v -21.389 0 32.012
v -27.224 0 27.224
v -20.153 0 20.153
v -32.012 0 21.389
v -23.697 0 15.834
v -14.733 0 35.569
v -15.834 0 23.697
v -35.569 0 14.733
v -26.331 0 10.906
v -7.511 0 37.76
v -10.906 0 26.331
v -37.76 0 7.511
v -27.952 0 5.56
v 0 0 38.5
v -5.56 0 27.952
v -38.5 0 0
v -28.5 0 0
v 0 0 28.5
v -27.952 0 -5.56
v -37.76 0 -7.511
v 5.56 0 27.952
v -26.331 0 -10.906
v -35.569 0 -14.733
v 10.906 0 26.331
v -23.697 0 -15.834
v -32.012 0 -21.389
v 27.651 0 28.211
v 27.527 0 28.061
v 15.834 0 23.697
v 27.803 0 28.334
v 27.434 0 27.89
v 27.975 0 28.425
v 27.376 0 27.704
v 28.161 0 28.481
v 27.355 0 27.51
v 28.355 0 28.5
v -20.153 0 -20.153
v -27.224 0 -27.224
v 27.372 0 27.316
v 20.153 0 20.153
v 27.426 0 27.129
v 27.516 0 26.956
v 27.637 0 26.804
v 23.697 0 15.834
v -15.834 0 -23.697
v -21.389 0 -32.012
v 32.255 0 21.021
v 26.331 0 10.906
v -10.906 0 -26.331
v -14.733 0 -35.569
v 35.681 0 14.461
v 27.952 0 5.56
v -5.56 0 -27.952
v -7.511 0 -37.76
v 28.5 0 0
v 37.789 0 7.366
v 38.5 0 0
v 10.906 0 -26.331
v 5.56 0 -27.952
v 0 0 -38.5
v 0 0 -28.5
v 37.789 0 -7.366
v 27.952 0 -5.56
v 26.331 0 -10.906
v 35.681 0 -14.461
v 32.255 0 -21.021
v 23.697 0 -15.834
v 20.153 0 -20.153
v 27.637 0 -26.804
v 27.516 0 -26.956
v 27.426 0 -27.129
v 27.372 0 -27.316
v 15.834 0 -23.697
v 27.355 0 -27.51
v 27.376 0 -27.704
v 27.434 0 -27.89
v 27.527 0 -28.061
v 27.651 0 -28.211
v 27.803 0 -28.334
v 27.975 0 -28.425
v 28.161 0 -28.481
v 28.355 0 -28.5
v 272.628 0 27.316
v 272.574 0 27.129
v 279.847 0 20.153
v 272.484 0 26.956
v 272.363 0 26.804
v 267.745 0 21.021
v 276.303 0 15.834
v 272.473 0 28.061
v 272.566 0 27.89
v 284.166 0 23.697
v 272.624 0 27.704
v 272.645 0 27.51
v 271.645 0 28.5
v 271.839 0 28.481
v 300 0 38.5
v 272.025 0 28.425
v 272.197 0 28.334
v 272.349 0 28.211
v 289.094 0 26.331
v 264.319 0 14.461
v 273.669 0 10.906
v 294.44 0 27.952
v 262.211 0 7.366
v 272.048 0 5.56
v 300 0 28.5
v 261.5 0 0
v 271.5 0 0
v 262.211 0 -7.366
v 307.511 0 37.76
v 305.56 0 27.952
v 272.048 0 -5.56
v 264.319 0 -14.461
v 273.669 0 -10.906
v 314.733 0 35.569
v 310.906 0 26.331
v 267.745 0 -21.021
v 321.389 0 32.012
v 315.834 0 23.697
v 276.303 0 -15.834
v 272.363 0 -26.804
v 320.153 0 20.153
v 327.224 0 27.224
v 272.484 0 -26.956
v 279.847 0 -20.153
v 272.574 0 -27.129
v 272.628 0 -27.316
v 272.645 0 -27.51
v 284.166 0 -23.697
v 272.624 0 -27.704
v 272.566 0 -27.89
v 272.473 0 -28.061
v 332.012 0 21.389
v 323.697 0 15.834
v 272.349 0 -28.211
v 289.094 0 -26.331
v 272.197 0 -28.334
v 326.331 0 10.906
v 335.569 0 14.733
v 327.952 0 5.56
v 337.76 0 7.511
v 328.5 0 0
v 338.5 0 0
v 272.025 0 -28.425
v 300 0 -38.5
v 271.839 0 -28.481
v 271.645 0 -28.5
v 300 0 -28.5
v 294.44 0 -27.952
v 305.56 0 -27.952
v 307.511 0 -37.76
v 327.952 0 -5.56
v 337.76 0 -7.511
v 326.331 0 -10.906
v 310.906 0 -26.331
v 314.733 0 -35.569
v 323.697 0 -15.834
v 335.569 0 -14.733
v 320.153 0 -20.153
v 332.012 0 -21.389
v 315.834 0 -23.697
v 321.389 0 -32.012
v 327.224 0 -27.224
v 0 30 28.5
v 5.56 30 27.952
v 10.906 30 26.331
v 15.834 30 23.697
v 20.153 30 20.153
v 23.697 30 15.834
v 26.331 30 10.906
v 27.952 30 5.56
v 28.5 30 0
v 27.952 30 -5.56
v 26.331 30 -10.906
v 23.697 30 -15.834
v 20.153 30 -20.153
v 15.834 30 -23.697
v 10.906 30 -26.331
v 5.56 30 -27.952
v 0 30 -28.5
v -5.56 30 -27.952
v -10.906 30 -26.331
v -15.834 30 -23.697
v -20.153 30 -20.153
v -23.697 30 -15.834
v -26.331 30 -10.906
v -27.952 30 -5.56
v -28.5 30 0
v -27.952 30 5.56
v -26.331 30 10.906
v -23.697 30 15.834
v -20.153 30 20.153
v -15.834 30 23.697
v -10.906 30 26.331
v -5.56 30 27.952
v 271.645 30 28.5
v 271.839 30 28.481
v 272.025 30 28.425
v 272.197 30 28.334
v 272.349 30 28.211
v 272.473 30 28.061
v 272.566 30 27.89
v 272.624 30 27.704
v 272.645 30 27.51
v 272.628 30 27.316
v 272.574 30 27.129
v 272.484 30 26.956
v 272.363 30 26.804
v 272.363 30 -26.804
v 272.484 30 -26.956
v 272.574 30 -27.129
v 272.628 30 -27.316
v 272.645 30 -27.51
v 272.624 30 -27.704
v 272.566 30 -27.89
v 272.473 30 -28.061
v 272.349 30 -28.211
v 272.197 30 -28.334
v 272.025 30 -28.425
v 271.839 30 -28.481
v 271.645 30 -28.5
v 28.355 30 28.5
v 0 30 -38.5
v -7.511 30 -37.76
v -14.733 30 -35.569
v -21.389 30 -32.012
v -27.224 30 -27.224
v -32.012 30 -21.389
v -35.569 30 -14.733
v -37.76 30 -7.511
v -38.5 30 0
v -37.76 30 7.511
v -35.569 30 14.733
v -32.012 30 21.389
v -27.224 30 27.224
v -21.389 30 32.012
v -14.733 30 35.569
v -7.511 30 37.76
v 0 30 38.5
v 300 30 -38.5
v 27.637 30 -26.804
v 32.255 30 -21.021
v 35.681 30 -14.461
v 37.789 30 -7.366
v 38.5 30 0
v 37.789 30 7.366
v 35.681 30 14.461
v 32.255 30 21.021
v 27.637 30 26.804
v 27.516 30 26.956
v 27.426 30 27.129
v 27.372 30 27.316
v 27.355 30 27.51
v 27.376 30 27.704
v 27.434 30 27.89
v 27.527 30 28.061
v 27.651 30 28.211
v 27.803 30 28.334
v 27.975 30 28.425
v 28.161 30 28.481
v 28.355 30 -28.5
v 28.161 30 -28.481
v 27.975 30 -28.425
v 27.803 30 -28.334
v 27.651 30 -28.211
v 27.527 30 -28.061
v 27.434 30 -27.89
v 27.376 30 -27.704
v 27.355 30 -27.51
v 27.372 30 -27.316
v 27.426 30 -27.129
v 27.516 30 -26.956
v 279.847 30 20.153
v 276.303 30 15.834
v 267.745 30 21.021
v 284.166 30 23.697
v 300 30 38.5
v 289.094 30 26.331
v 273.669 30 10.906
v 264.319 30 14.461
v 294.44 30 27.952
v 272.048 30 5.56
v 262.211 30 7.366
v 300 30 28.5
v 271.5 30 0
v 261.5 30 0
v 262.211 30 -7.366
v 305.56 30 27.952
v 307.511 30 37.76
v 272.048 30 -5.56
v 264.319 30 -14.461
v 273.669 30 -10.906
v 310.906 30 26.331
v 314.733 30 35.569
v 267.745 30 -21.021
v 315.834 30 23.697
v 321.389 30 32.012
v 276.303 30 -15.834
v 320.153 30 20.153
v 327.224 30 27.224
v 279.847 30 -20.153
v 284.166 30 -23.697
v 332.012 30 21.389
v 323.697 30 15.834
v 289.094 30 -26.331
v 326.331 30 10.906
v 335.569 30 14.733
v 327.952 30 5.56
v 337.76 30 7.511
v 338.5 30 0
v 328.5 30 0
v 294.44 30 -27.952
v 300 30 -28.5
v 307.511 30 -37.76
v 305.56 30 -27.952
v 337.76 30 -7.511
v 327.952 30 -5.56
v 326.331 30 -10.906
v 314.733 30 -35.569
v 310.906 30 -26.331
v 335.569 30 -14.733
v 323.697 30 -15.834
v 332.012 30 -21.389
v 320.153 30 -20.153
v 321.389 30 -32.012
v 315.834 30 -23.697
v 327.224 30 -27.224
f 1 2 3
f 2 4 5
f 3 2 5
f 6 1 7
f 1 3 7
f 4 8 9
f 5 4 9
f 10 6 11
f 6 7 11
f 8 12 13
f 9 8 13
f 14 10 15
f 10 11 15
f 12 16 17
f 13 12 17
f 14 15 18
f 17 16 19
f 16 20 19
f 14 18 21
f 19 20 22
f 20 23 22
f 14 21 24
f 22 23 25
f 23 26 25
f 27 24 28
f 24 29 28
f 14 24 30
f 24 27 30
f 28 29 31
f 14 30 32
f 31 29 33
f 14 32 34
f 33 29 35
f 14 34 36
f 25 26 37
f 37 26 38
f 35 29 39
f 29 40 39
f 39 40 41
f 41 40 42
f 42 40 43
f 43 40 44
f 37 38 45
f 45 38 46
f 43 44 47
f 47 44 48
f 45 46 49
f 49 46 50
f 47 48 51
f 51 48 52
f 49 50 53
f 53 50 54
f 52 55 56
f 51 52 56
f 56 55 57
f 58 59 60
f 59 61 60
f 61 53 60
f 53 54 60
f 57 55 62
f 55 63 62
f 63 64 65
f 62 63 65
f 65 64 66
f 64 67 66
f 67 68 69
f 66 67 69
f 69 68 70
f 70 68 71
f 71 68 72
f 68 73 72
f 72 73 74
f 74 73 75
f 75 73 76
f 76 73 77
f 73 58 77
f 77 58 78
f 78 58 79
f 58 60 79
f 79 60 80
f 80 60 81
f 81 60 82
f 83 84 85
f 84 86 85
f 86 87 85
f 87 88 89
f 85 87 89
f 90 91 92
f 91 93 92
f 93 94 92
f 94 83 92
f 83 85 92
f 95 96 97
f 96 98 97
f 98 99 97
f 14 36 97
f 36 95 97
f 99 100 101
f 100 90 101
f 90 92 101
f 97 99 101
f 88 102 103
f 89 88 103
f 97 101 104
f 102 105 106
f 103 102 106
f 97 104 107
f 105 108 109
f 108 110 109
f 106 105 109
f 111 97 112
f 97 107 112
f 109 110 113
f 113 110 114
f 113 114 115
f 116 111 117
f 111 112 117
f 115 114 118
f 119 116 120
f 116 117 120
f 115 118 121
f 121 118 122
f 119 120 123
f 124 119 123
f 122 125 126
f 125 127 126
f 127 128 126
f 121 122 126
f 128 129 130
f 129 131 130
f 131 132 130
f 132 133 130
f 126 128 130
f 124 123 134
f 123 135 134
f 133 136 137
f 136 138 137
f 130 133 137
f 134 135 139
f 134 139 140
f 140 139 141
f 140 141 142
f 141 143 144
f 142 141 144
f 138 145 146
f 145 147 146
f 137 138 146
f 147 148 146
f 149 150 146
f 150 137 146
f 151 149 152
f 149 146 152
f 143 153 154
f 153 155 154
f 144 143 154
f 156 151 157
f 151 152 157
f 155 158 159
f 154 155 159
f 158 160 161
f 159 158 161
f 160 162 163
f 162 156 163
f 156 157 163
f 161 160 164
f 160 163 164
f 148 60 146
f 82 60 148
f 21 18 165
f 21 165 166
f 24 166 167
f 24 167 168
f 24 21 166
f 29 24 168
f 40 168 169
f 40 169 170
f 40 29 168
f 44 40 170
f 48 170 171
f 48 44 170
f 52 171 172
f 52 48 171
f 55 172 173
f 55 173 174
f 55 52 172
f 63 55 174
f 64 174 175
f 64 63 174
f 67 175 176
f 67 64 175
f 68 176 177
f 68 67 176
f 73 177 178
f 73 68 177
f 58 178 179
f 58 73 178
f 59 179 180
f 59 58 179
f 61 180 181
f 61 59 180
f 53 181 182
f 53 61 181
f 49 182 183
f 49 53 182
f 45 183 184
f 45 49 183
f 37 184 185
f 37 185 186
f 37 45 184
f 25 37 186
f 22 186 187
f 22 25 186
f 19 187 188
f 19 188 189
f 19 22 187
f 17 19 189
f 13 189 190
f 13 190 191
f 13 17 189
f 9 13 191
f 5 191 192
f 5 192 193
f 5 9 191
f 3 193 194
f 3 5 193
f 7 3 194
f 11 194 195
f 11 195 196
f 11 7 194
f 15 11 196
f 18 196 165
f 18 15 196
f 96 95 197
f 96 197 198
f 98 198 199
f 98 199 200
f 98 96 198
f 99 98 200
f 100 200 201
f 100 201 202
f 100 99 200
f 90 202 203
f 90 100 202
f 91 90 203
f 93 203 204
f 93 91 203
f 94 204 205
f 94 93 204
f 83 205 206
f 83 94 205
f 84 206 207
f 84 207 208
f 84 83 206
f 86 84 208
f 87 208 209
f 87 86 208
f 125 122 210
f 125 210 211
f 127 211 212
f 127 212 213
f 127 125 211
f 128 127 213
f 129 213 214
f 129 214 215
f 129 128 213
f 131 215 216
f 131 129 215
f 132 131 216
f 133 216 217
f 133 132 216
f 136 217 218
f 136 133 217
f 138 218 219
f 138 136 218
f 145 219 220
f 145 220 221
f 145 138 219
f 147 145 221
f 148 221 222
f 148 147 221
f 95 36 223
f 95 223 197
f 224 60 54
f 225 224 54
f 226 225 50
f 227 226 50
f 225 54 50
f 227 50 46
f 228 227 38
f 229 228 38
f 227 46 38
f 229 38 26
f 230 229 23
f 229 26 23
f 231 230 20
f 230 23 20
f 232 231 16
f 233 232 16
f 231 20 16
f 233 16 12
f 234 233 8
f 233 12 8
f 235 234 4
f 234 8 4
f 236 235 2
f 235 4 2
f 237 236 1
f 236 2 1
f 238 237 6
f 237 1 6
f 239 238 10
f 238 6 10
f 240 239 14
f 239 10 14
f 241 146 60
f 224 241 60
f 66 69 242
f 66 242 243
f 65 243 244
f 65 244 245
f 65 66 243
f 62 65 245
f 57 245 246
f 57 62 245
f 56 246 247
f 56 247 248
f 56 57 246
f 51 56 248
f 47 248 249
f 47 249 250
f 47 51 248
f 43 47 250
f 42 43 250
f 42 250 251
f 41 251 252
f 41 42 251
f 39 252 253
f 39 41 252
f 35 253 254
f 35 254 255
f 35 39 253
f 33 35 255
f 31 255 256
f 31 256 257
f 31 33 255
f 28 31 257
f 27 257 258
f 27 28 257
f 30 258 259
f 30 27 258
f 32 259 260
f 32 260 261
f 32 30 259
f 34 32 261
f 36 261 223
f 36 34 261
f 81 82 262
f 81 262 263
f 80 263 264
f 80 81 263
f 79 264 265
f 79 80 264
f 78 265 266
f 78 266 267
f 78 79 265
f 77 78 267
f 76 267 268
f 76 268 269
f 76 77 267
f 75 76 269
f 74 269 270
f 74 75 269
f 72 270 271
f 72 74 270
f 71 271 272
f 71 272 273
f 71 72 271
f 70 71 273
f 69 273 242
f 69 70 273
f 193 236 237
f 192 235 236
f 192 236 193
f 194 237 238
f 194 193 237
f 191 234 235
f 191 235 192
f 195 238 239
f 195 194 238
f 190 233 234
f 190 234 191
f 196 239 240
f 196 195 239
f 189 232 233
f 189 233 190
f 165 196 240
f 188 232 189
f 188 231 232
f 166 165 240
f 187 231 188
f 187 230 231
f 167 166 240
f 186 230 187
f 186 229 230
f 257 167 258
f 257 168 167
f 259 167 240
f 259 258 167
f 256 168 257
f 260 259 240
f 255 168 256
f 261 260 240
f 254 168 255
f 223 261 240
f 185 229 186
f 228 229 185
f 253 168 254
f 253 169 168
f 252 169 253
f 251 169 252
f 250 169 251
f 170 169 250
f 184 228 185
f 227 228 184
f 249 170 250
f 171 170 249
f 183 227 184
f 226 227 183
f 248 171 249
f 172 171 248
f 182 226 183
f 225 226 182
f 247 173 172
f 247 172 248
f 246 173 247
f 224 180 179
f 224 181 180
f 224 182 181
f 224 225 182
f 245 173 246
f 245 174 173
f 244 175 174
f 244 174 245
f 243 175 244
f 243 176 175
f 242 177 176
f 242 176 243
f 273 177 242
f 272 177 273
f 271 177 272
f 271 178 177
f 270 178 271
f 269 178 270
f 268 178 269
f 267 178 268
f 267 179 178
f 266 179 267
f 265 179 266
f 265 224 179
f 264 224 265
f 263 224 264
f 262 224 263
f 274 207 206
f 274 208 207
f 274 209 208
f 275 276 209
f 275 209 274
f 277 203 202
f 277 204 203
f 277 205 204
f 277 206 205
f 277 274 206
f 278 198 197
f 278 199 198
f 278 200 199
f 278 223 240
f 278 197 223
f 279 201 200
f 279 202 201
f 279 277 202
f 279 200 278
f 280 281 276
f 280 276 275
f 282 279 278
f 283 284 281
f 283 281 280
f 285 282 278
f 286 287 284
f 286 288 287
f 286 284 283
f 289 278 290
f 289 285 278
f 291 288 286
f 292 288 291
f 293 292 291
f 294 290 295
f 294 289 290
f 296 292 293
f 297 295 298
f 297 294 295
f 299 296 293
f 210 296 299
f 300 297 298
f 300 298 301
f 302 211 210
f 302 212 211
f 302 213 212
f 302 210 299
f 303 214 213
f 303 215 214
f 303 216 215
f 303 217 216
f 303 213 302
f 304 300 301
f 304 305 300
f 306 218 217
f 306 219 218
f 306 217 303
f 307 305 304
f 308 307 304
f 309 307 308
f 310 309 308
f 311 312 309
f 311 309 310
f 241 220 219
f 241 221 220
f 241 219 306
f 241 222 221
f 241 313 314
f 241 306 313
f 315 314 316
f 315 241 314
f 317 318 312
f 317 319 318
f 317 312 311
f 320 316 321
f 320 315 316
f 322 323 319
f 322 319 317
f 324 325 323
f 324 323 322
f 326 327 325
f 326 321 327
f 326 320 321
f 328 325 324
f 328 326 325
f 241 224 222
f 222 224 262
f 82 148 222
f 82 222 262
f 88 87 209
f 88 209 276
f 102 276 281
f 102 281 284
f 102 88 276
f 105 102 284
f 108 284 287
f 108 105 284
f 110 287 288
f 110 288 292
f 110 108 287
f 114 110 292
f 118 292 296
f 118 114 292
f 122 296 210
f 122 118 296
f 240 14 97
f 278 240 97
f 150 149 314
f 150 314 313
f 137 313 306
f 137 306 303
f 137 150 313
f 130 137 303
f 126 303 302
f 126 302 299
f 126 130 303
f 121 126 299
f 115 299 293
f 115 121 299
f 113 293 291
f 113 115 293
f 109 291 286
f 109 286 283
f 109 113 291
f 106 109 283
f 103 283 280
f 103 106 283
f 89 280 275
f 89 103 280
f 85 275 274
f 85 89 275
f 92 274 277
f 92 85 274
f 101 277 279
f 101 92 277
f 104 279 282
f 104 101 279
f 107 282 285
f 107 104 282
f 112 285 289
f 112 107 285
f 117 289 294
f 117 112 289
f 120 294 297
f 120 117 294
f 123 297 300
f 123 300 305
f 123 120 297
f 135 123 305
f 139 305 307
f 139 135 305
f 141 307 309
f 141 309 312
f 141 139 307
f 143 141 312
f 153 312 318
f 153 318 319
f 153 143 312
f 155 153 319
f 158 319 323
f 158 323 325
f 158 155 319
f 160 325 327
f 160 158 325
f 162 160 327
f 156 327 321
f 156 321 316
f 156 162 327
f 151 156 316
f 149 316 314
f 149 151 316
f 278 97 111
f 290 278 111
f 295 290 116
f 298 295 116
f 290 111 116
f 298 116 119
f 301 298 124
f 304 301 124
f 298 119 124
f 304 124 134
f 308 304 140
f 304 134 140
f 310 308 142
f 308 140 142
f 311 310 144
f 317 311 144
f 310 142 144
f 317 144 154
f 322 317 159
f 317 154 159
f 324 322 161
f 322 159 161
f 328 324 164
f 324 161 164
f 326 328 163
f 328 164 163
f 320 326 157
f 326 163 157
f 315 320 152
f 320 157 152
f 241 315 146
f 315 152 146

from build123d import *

# Parameters (mm, degrees)
SKETCH_1_R      = 28.5
EXTRUDE_1_DEPTH = 30


with BuildPart() as part:
    # 草图1 → 凸台-拉伸1 (new body)
    with BuildSketch(Plane(origin=(0, 0, 0), x_dir=(1, 0, 0), z_dir=(0, 1, 0))):
        with BuildLine():
            Line((0, -38.5), (300, -38.5))
            ThreePointArc((300, -38.5), (338.5, 0), (300, 38.5))
            Line((300, 38.5), (0, 38.5))
            ThreePointArc((0, 38.5), (-38.5, 0), (0, -38.5))
        make_face()
        with Locations(Location((0, 0, 0), (0, 0, 270))):
            Circle(SKETCH_1_R, mode=Mode.SUBTRACT)
        with Locations(Location((300, 0, 0), (0, 0, 90))):
            Circle(SKETCH_1_R, mode=Mode.SUBTRACT)
        with BuildLine():
            Line((28.354893758, -28.5), (271.645106242, -28.5))
            ThreePointArc((271.645106242, -28.5), (272.566030379, -27.889741881), (272.362951654, -26.803797468))
            ThreePointArc((272.362951654, -26.803797468), (261.5, 0), (272.362951654, 26.803797468))
            ThreePointArc((272.362951654, 26.803797468), (272.566030379, 27.889741881), (271.645106242, 28.5))
            Line((271.645106242, 28.5), (28.354893758, 28.5))
            ThreePointArc((28.354893758, 28.5), (27.433969621, 27.889741881), (27.637048346, 26.803797468))
            ThreePointArc((27.637048346, 26.803797468), (38.5, 0), (27.637048346, -26.803797468))
            ThreePointArc((27.637048346, -26.803797468), (27.433969621, -27.889741881), (28.354893758, -28.5))
        make_face(mode=Mode.SUBTRACT)
    extrude(amount=EXTRUDE_1_DEPTH)


solid = part.part
